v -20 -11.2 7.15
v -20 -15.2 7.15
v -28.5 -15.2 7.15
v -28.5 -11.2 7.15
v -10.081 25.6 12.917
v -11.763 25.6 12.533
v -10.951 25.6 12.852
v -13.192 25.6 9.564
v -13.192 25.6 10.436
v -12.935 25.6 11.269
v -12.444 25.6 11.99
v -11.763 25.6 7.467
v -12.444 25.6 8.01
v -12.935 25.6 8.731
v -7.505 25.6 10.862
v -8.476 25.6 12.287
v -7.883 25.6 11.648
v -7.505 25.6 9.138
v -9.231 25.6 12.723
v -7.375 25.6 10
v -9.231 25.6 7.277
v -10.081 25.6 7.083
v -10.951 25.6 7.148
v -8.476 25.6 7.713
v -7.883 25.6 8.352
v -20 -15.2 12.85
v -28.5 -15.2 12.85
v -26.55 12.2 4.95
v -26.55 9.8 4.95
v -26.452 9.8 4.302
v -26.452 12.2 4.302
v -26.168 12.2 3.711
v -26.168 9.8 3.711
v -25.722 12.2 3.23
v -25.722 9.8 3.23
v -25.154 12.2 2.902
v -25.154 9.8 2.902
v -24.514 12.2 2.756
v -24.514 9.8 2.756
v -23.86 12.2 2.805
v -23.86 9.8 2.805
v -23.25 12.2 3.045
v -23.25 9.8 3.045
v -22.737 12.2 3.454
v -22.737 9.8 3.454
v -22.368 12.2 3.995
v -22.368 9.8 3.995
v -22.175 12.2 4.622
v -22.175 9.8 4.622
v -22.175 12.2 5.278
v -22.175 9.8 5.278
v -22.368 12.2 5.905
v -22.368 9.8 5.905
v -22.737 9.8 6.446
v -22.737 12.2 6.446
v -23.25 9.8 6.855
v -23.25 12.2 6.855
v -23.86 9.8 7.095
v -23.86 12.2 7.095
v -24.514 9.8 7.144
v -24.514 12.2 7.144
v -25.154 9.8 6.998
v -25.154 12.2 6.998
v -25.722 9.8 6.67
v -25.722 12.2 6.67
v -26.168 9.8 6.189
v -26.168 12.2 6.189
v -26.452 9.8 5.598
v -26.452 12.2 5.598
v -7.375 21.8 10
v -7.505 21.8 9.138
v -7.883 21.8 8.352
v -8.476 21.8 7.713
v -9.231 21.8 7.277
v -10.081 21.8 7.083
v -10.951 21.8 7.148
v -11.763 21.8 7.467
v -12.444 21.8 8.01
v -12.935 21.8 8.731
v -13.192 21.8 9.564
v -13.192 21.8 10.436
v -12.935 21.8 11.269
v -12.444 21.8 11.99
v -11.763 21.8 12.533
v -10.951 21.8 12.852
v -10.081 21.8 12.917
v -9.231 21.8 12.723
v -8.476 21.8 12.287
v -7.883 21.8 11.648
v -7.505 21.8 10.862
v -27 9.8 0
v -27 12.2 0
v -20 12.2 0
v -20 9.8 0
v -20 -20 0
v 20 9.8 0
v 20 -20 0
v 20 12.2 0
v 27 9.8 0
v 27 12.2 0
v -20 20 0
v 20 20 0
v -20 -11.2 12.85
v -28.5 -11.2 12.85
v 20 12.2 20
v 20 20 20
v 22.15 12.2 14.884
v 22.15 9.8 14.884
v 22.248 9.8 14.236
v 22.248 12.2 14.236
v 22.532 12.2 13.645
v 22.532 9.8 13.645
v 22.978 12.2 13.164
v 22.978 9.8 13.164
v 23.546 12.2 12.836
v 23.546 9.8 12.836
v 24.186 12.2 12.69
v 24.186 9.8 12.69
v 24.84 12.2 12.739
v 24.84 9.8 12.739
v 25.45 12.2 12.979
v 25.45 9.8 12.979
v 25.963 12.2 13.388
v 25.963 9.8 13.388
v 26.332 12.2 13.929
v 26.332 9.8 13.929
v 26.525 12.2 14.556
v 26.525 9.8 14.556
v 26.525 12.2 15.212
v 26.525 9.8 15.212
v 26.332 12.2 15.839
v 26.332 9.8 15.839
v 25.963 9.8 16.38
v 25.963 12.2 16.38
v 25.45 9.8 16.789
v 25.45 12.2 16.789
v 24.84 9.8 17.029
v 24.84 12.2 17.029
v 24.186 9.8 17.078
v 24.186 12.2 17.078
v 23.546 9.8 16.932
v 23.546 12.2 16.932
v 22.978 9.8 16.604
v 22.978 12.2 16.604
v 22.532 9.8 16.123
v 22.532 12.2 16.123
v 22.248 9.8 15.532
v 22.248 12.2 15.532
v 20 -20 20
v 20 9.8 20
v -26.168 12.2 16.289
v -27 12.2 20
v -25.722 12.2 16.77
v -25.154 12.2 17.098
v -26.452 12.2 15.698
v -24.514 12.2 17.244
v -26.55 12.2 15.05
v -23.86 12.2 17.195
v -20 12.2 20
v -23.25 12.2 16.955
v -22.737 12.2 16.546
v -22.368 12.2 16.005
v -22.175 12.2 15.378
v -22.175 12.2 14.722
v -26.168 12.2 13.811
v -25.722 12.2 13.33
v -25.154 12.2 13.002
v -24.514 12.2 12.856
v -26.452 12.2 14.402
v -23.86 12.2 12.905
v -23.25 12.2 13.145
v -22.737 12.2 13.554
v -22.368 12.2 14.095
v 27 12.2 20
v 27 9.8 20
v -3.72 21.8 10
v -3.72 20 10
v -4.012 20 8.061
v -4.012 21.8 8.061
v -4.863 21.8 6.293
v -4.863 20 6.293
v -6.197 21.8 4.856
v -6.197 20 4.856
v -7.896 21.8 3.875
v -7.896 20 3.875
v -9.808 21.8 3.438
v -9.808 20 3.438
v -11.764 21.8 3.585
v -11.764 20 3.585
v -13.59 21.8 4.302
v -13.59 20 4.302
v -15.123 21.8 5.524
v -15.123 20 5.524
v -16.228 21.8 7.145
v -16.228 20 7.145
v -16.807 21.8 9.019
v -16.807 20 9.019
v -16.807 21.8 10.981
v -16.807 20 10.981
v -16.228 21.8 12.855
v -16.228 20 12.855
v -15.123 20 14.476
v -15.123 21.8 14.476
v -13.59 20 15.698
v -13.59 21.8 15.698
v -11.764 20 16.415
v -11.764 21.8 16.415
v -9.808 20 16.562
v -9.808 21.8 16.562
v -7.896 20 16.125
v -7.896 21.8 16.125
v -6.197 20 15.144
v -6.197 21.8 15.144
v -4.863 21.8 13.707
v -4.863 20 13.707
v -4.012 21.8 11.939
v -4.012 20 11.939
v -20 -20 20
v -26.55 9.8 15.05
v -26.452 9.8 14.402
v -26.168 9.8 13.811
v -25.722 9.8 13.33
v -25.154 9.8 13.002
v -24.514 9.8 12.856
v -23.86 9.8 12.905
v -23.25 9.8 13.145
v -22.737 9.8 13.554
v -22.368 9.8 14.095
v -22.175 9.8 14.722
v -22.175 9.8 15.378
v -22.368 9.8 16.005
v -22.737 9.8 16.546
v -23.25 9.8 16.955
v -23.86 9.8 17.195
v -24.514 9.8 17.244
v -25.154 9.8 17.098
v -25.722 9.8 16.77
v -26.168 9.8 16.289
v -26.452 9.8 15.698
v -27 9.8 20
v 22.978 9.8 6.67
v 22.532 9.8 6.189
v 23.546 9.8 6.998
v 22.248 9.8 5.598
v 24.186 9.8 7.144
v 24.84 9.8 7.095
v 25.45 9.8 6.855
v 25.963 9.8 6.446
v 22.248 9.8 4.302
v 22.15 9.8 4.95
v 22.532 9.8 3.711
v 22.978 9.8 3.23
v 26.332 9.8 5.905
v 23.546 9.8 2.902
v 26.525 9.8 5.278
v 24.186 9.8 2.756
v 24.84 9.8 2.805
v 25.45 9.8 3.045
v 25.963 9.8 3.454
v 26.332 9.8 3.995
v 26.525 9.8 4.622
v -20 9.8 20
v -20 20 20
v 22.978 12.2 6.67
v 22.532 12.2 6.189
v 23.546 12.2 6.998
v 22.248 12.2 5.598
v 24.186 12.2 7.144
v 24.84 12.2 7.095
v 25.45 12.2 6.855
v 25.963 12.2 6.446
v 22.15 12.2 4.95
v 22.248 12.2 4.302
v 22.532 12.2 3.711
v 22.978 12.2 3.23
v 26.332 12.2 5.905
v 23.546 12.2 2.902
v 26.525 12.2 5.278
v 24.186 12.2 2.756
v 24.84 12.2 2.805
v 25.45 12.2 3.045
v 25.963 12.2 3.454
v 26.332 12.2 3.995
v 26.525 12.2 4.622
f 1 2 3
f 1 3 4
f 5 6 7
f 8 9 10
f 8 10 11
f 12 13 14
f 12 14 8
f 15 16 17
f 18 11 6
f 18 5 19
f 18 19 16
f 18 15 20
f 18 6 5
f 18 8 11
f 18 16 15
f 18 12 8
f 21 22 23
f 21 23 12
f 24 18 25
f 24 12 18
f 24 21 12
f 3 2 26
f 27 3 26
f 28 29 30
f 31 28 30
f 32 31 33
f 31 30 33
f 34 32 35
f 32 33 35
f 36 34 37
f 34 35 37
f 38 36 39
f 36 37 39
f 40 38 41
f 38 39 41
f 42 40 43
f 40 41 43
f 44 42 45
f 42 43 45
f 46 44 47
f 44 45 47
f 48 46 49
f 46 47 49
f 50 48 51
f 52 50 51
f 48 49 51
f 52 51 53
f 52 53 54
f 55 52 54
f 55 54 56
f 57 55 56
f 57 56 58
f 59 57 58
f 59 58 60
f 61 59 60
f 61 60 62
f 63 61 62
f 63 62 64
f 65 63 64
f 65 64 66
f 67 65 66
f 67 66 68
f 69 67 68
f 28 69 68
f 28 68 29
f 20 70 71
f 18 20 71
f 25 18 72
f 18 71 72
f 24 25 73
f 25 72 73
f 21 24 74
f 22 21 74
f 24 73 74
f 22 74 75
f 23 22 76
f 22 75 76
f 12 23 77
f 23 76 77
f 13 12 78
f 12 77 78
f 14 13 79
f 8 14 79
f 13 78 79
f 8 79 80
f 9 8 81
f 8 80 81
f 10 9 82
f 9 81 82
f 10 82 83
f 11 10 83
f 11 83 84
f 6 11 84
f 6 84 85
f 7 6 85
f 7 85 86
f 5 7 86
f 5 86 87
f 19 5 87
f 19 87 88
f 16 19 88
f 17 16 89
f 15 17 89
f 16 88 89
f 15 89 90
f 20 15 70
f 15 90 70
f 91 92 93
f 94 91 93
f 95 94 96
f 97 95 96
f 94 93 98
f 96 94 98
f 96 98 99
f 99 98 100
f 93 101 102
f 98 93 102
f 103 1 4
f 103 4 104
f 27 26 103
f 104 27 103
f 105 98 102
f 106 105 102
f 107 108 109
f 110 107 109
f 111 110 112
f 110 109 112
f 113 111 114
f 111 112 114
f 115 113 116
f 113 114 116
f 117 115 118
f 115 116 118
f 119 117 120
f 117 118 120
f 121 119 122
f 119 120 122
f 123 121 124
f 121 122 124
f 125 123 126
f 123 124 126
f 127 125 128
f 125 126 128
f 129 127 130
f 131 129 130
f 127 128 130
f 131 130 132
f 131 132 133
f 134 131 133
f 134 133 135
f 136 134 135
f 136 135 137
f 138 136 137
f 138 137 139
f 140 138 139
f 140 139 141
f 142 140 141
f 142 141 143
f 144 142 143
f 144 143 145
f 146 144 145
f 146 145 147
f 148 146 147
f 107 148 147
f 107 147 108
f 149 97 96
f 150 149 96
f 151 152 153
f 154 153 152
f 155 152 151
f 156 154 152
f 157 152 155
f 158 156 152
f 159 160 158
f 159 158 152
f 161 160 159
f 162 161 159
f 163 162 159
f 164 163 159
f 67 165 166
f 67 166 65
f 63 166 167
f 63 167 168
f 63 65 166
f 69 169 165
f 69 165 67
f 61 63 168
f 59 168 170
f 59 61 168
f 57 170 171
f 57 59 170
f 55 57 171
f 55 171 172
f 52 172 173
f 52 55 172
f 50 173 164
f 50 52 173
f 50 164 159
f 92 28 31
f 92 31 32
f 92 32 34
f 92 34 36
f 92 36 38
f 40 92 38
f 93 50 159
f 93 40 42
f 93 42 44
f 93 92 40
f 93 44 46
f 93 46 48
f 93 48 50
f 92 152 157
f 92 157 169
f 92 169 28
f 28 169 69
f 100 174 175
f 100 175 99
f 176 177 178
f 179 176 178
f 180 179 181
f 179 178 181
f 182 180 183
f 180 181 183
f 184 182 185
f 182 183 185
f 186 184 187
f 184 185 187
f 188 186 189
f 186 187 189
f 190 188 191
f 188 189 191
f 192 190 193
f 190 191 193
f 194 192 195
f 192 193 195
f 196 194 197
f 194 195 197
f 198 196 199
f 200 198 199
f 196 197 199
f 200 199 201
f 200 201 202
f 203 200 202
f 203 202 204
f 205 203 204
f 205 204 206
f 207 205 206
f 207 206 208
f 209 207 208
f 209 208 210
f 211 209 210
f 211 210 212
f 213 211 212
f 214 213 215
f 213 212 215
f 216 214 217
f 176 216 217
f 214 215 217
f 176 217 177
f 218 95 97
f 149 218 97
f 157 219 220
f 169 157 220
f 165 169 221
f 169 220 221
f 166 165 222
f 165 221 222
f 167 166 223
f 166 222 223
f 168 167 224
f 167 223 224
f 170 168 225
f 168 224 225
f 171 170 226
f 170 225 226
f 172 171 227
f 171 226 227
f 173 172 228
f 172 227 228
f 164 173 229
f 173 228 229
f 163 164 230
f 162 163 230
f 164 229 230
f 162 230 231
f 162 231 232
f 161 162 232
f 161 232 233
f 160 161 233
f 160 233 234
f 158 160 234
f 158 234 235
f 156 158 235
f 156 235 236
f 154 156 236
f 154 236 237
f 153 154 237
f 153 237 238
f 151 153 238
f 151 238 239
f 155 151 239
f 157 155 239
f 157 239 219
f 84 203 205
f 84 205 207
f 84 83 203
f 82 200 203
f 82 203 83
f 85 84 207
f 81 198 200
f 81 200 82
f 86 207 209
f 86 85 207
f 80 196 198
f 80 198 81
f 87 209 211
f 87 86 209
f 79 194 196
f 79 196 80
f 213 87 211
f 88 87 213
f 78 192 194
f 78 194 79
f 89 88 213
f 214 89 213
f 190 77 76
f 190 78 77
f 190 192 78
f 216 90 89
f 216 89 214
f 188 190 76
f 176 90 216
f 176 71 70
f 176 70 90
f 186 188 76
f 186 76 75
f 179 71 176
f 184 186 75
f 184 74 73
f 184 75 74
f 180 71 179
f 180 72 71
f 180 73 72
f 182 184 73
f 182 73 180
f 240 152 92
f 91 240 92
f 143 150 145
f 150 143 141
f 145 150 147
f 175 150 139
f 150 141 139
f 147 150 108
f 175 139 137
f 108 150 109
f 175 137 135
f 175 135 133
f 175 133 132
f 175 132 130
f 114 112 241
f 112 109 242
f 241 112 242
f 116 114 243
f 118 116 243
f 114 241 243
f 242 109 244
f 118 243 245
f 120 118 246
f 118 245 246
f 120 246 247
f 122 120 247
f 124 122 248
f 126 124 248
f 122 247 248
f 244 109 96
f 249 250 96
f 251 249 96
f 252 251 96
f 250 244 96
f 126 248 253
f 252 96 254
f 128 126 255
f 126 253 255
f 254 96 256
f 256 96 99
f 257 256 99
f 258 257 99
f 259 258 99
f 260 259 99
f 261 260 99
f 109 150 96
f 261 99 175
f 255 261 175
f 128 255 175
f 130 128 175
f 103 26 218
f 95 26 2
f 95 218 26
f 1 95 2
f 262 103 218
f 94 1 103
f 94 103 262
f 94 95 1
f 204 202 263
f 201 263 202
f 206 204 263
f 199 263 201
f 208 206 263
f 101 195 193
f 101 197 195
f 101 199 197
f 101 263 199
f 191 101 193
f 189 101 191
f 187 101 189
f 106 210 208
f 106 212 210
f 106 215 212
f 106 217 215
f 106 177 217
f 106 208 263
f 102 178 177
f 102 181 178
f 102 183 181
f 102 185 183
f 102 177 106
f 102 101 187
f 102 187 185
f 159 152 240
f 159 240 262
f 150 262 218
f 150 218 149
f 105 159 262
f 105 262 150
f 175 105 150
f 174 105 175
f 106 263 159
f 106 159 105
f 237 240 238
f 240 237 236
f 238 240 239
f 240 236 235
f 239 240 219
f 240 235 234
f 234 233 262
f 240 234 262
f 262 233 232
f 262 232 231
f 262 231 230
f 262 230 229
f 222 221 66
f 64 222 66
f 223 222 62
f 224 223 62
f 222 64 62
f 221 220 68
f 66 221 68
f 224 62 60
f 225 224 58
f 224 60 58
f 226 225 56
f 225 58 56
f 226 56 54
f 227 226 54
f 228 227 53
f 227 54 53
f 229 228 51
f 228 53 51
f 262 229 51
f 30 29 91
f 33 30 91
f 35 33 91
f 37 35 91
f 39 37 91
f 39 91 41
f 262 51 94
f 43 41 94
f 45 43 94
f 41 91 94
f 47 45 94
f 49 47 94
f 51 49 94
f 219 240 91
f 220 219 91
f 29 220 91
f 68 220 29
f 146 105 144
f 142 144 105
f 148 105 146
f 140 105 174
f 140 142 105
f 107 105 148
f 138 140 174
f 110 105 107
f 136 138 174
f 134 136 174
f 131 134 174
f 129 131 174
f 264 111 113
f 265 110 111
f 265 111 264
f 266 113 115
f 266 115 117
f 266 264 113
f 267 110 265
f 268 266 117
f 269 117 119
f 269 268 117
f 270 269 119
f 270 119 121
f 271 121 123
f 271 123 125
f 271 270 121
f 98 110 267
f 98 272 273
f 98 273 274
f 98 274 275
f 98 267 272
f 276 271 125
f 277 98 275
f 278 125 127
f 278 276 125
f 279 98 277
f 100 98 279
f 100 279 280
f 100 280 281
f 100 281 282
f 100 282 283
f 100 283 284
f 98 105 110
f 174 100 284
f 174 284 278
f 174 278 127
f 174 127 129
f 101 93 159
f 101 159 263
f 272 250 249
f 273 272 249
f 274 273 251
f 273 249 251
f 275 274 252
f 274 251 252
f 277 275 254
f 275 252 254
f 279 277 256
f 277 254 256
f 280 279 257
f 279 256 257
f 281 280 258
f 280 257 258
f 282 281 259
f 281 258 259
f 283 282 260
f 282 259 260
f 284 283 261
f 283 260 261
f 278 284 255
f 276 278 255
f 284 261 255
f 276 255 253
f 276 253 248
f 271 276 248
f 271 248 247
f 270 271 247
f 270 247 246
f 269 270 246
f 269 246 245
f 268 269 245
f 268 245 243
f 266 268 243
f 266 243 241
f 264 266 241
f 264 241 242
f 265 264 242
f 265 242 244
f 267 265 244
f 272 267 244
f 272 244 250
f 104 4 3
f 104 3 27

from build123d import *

# Parameters (mm, degrees)
SKETCH_1_W              = 40
SKETCH_1_H              = 40
EXTRUDE_1_DEPTH         = 20
SKETCH_2_R              = 6.58
EXTRUDE_2_DEPTH         = 1.8
SKETCH_3_R              = 2.925
EXTRUDE_3_DEPTH         = 3.8
SKETCH_4_W              = 7
SKETCH_4_H              = 20
EXTRUDE_4_DEPTH         = 2.4
HOLE_WIZARD_4_4_4_4_1_D = 4.4
SKETCH_7_W              = 5.7
SKETCH_7_H              = 4
EXTRUDE_5_DEPTH         = 8.5


with BuildPart() as part:
    # 草图1 → 凸台-拉伸1 (new body)
    with BuildSketch(Plane.XY):
        Rectangle(SKETCH_1_W, SKETCH_1_H)
    extrude(amount=EXTRUDE_1_DEPTH)

    # 草图2 → 凸台-拉伸2 (add)
    with BuildSketch(Plane(origin=(0, 20, 0), x_dir=(1, 0, 0), z_dir=(0, 1, 0))):
        with Locations((-10.3, -10)):
            Circle(SKETCH_2_R)
    extrude(amount=EXTRUDE_2_DEPTH)

    # 草图3 → 凸台-拉伸3 (add)
    with BuildSketch(Plane(origin=(0, 21.8, 0), x_dir=(1, 0, 0), z_dir=(0, 1, 0))):
        with Locations((-10.3, -10)):
            Circle(SKETCH_3_R)
    extrude(amount=EXTRUDE_3_DEPTH)

    # 草图4 → 凸台-拉伸4 (add)
    with BuildSketch(Plane(origin=(0, 12.2, 0), x_dir=(1, 0, 0), z_dir=(0, 1, 0))):
        with Locations((-23.5, -10)):
            Rectangle(SKETCH_4_W, SKETCH_4_H)
        with Locations((23.5, -10)):
            Rectangle(SKETCH_4_W, SKETCH_4_H)
    extrude(amount=-EXTRUDE_4_DEPTH)

    # Ø4.4 (4.4) 直径孔1 (through all)
    with Locations(Plane(origin=(0, 12.2, 0), x_dir=(1, 0, 0), z_dir=(0, 1, 0))):
        with Locations((-24.35, -4.95), (-24.35, -15.05), (24.35, -4.95), (24.35, -14.883974449)):
            Hole(HOLE_WIZARD_4_4_4_4_1_D / 2)

    # 草图7 → 凸台-拉伸5 (add)
    with BuildSketch(Plane.ZY.offset(20)):
        with Locations((10, -13.2)):
            Rectangle(SKETCH_7_W, SKETCH_7_H)
    extrude(amount=EXTRUDE_5_DEPTH)


solid = part.part
